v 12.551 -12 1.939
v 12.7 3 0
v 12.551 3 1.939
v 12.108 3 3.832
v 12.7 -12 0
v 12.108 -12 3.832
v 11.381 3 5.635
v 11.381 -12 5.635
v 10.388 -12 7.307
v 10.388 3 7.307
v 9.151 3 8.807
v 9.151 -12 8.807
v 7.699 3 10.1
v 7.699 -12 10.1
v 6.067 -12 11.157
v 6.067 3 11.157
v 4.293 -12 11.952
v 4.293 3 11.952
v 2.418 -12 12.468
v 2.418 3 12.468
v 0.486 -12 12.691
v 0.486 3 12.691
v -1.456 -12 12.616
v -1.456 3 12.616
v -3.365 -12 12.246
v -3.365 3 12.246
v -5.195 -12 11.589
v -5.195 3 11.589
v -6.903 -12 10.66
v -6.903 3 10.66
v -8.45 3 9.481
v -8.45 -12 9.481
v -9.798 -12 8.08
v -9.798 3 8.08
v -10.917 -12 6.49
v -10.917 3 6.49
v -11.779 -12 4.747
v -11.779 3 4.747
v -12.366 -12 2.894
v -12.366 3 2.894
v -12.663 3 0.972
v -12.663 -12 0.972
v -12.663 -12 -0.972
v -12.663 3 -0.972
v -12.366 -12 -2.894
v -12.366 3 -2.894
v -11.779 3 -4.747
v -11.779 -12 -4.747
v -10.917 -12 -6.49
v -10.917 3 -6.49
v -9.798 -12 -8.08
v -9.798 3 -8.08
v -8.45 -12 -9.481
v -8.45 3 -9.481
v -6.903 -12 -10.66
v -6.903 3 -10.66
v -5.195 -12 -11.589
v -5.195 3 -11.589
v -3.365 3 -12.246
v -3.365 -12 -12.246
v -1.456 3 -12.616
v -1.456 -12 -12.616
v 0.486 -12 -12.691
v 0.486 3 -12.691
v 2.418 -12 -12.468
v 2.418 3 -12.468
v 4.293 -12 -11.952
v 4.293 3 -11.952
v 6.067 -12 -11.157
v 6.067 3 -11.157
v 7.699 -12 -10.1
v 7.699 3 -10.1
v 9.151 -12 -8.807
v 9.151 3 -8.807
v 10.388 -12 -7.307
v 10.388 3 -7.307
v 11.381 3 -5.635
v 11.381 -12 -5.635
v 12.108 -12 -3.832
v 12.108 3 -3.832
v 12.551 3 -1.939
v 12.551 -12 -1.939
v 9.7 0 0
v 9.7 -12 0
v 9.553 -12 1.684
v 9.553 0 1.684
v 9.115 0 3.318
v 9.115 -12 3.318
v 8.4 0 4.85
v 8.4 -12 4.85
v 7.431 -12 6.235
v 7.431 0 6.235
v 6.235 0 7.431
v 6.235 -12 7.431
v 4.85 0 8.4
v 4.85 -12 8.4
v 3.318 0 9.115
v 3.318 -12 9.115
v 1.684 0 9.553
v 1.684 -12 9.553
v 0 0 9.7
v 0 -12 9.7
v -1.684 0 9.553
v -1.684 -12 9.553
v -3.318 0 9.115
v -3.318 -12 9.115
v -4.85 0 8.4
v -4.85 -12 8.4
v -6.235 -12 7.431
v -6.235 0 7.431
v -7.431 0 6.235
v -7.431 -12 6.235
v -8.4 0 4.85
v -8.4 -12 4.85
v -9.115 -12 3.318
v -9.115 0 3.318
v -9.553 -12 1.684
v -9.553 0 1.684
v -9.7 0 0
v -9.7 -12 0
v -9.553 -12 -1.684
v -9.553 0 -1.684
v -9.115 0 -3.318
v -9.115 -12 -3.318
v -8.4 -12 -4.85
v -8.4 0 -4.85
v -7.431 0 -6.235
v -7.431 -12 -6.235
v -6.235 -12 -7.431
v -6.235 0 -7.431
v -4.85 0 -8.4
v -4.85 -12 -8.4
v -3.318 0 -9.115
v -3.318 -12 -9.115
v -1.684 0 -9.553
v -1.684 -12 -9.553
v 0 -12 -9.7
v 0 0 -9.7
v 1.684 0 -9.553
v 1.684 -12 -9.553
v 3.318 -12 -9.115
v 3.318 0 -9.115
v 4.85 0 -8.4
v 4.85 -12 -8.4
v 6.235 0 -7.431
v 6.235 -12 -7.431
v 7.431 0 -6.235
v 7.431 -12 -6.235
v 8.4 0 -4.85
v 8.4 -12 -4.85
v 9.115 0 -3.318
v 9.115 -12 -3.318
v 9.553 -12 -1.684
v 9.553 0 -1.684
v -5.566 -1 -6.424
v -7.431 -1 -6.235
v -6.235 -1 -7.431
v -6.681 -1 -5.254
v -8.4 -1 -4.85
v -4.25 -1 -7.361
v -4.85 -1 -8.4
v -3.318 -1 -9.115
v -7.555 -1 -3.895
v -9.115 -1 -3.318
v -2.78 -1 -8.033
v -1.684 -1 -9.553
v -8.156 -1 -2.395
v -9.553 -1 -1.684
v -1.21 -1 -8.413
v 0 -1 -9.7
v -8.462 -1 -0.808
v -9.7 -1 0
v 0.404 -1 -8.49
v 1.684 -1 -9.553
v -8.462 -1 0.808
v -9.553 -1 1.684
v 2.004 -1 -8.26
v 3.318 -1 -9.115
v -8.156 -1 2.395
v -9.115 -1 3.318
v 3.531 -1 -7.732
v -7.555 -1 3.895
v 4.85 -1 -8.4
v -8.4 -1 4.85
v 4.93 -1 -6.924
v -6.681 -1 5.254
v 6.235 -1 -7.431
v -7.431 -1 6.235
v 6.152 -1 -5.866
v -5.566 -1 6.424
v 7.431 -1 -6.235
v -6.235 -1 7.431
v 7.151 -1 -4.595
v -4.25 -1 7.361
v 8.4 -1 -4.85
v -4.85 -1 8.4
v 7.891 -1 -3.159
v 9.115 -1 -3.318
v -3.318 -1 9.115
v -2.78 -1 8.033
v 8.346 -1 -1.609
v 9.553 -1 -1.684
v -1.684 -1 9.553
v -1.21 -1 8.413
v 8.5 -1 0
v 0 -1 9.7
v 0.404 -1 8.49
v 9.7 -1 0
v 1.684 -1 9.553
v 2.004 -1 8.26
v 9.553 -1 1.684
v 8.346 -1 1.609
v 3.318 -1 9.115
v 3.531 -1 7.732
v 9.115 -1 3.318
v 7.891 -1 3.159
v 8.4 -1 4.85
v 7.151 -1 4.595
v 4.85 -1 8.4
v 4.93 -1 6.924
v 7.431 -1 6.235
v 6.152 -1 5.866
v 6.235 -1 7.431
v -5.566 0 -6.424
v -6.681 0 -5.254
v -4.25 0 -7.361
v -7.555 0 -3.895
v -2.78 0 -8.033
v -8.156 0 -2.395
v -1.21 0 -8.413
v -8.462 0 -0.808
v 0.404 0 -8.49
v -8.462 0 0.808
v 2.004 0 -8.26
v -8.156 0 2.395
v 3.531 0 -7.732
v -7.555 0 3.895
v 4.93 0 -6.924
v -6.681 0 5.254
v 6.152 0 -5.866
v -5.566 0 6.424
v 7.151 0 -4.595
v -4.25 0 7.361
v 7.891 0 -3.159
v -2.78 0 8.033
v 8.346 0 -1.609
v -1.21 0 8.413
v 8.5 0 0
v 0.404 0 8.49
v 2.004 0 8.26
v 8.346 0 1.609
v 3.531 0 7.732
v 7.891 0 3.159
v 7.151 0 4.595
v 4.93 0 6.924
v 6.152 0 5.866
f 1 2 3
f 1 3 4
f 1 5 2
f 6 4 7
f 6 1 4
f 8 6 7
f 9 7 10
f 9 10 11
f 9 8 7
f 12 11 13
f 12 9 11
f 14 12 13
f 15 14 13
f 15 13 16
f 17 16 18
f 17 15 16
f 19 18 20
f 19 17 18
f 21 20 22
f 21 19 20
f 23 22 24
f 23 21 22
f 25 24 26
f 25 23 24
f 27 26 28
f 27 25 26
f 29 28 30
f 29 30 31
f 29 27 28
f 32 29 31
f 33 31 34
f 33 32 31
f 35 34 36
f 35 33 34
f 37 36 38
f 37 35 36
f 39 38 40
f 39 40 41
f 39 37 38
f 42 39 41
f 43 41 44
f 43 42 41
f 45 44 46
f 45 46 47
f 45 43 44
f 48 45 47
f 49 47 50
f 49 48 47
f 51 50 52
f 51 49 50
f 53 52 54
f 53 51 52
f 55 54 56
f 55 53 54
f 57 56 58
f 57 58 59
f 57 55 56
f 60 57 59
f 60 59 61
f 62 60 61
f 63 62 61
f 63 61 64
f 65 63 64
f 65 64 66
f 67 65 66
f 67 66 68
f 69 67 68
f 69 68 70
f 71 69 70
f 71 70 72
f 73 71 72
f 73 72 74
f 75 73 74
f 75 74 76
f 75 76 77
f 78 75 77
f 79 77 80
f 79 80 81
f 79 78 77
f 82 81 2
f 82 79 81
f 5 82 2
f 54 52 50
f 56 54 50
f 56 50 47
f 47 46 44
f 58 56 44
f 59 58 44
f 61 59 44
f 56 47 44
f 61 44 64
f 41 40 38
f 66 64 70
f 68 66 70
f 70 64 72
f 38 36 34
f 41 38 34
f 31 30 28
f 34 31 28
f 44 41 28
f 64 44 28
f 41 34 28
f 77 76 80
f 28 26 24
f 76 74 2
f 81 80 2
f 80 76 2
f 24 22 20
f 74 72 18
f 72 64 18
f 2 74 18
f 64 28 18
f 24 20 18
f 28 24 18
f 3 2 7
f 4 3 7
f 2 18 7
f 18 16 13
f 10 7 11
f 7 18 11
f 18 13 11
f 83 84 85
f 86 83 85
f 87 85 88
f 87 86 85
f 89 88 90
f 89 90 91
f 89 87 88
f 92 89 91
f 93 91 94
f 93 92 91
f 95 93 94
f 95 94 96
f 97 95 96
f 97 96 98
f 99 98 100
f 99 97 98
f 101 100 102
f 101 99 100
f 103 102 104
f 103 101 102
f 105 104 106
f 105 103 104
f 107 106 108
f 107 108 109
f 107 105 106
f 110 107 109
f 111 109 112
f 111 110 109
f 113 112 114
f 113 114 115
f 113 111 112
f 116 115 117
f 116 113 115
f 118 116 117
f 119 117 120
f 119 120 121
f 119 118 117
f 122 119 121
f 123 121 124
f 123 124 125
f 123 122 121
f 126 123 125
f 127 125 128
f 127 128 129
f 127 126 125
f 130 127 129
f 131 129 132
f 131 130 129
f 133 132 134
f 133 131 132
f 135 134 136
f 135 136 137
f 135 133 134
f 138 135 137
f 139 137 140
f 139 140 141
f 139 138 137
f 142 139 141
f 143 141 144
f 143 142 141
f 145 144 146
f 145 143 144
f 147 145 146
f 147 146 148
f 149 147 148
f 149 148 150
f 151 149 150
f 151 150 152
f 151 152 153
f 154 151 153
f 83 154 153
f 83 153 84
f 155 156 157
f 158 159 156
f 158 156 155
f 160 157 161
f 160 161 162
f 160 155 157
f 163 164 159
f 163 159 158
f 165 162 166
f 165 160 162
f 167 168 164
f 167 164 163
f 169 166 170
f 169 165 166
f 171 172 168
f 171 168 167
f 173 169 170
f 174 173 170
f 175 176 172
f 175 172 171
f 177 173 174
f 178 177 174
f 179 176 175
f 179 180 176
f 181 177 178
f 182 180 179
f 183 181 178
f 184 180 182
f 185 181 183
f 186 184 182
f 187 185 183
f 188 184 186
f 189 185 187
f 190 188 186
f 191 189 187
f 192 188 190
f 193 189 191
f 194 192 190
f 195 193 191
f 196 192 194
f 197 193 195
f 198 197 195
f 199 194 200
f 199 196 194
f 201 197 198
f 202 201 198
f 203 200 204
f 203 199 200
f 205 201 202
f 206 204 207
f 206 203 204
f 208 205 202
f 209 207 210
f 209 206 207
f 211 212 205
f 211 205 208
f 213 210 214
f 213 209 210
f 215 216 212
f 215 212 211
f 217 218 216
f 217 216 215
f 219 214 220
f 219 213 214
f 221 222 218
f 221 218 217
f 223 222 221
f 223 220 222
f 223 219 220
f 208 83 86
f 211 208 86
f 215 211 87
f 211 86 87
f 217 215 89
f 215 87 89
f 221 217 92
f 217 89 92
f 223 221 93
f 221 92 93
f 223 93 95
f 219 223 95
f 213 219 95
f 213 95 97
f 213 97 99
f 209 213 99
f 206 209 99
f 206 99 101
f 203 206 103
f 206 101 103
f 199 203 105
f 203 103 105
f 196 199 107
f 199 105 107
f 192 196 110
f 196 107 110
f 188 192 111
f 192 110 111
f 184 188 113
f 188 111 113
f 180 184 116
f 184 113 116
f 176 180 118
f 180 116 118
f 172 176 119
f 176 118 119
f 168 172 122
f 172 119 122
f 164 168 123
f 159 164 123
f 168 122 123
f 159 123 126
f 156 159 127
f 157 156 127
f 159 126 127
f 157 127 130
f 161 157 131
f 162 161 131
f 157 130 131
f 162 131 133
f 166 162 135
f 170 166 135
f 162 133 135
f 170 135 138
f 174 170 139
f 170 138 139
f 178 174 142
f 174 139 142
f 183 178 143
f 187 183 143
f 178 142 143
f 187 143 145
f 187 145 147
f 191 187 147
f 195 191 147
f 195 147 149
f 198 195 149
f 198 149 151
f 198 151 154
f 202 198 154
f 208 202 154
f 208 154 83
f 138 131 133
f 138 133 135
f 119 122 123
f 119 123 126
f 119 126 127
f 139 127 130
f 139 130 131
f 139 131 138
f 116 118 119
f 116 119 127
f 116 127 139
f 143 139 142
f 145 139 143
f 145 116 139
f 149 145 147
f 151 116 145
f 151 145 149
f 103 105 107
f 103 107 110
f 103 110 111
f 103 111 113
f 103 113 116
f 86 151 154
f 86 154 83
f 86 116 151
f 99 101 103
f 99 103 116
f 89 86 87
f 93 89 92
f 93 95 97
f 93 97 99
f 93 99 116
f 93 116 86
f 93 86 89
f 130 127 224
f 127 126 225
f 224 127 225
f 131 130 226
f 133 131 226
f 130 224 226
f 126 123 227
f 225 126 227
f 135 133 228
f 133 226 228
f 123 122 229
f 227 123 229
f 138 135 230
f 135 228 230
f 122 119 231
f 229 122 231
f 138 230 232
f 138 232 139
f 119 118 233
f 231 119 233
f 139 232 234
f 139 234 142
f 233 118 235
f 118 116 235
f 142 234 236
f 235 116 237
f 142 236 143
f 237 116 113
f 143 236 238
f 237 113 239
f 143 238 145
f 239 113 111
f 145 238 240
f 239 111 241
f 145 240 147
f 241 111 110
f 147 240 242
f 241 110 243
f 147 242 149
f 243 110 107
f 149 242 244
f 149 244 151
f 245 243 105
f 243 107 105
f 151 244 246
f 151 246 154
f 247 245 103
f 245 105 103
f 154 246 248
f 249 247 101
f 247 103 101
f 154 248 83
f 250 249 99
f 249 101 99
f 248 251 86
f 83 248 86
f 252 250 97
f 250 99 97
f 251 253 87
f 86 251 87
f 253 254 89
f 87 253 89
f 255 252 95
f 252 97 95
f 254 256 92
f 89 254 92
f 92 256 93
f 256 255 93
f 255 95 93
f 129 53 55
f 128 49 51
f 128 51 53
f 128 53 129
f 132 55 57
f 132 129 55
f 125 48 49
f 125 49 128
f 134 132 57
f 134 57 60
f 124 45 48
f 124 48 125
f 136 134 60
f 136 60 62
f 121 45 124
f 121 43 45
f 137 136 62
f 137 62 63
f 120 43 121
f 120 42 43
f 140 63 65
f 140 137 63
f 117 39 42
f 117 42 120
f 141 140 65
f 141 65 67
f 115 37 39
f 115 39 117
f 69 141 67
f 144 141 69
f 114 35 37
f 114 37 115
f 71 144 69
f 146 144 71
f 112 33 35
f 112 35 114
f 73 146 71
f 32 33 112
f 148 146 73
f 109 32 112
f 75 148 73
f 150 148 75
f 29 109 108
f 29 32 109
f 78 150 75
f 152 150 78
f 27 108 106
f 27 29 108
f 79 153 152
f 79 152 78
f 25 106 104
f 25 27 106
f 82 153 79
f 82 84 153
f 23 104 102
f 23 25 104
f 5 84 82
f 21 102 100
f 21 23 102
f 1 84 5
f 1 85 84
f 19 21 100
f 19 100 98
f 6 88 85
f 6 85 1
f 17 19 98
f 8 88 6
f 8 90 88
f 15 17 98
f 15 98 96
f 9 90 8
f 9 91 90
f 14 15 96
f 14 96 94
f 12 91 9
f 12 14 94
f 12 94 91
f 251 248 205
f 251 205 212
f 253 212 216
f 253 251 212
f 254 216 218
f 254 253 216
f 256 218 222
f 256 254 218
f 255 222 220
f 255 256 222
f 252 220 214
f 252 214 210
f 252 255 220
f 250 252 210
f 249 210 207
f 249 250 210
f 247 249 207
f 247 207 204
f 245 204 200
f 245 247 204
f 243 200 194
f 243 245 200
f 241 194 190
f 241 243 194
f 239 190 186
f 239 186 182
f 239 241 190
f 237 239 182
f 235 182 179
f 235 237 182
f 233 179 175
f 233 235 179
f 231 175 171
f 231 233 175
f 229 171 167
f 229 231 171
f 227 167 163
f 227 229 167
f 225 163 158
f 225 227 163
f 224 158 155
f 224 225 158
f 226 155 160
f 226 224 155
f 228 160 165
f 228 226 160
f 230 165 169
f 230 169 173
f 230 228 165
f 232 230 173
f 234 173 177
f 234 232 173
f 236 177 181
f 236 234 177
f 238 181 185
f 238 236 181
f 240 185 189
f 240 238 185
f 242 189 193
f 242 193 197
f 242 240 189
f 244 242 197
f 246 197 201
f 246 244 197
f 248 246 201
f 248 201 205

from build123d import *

# Parameters (mm, degrees)
F0_R          = 12.7
F0_R_2        = 9.7
F1_DEPTH      = 12
F1_DEPTH_BACK = 3
F0_R_3        = 8.5
F2_DEPTH      = 1
F3_DEPTH      = 3


with BuildPart() as f1:
    # F0 (on Front) → F1 (new body, two sides)
    with BuildSketch(Plane.XZ) as f1_sk:
        Circle(F0_R)
        Circle(F0_R_2, mode=Mode.SUBTRACT)
    extrude(amount=F1_DEPTH)
    extrude(f1_sk.sketch, amount=-F1_DEPTH_BACK)

    # F0 (on Front) → F3 (join)
    with BuildSketch(Plane.XZ):
        Circle(F0_R)
        Circle(F0_R_2, mode=Mode.SUBTRACT)
        Circle(F0_R_2)
        Circle(F0_R_3, mode=Mode.SUBTRACT)
        Circle(F0_R_3)
    extrude(amount=-F3_DEPTH)


with BuildPart() as f2:
    # F0 (on Front) → F2 (new body)
    with BuildSketch(Plane.XZ):
        Circle(F0_R_2)
        Circle(F0_R_3, mode=Mode.SUBTRACT)
    extrude(amount=F2_DEPTH)


solid = Compound([f1.part, f2.part])
